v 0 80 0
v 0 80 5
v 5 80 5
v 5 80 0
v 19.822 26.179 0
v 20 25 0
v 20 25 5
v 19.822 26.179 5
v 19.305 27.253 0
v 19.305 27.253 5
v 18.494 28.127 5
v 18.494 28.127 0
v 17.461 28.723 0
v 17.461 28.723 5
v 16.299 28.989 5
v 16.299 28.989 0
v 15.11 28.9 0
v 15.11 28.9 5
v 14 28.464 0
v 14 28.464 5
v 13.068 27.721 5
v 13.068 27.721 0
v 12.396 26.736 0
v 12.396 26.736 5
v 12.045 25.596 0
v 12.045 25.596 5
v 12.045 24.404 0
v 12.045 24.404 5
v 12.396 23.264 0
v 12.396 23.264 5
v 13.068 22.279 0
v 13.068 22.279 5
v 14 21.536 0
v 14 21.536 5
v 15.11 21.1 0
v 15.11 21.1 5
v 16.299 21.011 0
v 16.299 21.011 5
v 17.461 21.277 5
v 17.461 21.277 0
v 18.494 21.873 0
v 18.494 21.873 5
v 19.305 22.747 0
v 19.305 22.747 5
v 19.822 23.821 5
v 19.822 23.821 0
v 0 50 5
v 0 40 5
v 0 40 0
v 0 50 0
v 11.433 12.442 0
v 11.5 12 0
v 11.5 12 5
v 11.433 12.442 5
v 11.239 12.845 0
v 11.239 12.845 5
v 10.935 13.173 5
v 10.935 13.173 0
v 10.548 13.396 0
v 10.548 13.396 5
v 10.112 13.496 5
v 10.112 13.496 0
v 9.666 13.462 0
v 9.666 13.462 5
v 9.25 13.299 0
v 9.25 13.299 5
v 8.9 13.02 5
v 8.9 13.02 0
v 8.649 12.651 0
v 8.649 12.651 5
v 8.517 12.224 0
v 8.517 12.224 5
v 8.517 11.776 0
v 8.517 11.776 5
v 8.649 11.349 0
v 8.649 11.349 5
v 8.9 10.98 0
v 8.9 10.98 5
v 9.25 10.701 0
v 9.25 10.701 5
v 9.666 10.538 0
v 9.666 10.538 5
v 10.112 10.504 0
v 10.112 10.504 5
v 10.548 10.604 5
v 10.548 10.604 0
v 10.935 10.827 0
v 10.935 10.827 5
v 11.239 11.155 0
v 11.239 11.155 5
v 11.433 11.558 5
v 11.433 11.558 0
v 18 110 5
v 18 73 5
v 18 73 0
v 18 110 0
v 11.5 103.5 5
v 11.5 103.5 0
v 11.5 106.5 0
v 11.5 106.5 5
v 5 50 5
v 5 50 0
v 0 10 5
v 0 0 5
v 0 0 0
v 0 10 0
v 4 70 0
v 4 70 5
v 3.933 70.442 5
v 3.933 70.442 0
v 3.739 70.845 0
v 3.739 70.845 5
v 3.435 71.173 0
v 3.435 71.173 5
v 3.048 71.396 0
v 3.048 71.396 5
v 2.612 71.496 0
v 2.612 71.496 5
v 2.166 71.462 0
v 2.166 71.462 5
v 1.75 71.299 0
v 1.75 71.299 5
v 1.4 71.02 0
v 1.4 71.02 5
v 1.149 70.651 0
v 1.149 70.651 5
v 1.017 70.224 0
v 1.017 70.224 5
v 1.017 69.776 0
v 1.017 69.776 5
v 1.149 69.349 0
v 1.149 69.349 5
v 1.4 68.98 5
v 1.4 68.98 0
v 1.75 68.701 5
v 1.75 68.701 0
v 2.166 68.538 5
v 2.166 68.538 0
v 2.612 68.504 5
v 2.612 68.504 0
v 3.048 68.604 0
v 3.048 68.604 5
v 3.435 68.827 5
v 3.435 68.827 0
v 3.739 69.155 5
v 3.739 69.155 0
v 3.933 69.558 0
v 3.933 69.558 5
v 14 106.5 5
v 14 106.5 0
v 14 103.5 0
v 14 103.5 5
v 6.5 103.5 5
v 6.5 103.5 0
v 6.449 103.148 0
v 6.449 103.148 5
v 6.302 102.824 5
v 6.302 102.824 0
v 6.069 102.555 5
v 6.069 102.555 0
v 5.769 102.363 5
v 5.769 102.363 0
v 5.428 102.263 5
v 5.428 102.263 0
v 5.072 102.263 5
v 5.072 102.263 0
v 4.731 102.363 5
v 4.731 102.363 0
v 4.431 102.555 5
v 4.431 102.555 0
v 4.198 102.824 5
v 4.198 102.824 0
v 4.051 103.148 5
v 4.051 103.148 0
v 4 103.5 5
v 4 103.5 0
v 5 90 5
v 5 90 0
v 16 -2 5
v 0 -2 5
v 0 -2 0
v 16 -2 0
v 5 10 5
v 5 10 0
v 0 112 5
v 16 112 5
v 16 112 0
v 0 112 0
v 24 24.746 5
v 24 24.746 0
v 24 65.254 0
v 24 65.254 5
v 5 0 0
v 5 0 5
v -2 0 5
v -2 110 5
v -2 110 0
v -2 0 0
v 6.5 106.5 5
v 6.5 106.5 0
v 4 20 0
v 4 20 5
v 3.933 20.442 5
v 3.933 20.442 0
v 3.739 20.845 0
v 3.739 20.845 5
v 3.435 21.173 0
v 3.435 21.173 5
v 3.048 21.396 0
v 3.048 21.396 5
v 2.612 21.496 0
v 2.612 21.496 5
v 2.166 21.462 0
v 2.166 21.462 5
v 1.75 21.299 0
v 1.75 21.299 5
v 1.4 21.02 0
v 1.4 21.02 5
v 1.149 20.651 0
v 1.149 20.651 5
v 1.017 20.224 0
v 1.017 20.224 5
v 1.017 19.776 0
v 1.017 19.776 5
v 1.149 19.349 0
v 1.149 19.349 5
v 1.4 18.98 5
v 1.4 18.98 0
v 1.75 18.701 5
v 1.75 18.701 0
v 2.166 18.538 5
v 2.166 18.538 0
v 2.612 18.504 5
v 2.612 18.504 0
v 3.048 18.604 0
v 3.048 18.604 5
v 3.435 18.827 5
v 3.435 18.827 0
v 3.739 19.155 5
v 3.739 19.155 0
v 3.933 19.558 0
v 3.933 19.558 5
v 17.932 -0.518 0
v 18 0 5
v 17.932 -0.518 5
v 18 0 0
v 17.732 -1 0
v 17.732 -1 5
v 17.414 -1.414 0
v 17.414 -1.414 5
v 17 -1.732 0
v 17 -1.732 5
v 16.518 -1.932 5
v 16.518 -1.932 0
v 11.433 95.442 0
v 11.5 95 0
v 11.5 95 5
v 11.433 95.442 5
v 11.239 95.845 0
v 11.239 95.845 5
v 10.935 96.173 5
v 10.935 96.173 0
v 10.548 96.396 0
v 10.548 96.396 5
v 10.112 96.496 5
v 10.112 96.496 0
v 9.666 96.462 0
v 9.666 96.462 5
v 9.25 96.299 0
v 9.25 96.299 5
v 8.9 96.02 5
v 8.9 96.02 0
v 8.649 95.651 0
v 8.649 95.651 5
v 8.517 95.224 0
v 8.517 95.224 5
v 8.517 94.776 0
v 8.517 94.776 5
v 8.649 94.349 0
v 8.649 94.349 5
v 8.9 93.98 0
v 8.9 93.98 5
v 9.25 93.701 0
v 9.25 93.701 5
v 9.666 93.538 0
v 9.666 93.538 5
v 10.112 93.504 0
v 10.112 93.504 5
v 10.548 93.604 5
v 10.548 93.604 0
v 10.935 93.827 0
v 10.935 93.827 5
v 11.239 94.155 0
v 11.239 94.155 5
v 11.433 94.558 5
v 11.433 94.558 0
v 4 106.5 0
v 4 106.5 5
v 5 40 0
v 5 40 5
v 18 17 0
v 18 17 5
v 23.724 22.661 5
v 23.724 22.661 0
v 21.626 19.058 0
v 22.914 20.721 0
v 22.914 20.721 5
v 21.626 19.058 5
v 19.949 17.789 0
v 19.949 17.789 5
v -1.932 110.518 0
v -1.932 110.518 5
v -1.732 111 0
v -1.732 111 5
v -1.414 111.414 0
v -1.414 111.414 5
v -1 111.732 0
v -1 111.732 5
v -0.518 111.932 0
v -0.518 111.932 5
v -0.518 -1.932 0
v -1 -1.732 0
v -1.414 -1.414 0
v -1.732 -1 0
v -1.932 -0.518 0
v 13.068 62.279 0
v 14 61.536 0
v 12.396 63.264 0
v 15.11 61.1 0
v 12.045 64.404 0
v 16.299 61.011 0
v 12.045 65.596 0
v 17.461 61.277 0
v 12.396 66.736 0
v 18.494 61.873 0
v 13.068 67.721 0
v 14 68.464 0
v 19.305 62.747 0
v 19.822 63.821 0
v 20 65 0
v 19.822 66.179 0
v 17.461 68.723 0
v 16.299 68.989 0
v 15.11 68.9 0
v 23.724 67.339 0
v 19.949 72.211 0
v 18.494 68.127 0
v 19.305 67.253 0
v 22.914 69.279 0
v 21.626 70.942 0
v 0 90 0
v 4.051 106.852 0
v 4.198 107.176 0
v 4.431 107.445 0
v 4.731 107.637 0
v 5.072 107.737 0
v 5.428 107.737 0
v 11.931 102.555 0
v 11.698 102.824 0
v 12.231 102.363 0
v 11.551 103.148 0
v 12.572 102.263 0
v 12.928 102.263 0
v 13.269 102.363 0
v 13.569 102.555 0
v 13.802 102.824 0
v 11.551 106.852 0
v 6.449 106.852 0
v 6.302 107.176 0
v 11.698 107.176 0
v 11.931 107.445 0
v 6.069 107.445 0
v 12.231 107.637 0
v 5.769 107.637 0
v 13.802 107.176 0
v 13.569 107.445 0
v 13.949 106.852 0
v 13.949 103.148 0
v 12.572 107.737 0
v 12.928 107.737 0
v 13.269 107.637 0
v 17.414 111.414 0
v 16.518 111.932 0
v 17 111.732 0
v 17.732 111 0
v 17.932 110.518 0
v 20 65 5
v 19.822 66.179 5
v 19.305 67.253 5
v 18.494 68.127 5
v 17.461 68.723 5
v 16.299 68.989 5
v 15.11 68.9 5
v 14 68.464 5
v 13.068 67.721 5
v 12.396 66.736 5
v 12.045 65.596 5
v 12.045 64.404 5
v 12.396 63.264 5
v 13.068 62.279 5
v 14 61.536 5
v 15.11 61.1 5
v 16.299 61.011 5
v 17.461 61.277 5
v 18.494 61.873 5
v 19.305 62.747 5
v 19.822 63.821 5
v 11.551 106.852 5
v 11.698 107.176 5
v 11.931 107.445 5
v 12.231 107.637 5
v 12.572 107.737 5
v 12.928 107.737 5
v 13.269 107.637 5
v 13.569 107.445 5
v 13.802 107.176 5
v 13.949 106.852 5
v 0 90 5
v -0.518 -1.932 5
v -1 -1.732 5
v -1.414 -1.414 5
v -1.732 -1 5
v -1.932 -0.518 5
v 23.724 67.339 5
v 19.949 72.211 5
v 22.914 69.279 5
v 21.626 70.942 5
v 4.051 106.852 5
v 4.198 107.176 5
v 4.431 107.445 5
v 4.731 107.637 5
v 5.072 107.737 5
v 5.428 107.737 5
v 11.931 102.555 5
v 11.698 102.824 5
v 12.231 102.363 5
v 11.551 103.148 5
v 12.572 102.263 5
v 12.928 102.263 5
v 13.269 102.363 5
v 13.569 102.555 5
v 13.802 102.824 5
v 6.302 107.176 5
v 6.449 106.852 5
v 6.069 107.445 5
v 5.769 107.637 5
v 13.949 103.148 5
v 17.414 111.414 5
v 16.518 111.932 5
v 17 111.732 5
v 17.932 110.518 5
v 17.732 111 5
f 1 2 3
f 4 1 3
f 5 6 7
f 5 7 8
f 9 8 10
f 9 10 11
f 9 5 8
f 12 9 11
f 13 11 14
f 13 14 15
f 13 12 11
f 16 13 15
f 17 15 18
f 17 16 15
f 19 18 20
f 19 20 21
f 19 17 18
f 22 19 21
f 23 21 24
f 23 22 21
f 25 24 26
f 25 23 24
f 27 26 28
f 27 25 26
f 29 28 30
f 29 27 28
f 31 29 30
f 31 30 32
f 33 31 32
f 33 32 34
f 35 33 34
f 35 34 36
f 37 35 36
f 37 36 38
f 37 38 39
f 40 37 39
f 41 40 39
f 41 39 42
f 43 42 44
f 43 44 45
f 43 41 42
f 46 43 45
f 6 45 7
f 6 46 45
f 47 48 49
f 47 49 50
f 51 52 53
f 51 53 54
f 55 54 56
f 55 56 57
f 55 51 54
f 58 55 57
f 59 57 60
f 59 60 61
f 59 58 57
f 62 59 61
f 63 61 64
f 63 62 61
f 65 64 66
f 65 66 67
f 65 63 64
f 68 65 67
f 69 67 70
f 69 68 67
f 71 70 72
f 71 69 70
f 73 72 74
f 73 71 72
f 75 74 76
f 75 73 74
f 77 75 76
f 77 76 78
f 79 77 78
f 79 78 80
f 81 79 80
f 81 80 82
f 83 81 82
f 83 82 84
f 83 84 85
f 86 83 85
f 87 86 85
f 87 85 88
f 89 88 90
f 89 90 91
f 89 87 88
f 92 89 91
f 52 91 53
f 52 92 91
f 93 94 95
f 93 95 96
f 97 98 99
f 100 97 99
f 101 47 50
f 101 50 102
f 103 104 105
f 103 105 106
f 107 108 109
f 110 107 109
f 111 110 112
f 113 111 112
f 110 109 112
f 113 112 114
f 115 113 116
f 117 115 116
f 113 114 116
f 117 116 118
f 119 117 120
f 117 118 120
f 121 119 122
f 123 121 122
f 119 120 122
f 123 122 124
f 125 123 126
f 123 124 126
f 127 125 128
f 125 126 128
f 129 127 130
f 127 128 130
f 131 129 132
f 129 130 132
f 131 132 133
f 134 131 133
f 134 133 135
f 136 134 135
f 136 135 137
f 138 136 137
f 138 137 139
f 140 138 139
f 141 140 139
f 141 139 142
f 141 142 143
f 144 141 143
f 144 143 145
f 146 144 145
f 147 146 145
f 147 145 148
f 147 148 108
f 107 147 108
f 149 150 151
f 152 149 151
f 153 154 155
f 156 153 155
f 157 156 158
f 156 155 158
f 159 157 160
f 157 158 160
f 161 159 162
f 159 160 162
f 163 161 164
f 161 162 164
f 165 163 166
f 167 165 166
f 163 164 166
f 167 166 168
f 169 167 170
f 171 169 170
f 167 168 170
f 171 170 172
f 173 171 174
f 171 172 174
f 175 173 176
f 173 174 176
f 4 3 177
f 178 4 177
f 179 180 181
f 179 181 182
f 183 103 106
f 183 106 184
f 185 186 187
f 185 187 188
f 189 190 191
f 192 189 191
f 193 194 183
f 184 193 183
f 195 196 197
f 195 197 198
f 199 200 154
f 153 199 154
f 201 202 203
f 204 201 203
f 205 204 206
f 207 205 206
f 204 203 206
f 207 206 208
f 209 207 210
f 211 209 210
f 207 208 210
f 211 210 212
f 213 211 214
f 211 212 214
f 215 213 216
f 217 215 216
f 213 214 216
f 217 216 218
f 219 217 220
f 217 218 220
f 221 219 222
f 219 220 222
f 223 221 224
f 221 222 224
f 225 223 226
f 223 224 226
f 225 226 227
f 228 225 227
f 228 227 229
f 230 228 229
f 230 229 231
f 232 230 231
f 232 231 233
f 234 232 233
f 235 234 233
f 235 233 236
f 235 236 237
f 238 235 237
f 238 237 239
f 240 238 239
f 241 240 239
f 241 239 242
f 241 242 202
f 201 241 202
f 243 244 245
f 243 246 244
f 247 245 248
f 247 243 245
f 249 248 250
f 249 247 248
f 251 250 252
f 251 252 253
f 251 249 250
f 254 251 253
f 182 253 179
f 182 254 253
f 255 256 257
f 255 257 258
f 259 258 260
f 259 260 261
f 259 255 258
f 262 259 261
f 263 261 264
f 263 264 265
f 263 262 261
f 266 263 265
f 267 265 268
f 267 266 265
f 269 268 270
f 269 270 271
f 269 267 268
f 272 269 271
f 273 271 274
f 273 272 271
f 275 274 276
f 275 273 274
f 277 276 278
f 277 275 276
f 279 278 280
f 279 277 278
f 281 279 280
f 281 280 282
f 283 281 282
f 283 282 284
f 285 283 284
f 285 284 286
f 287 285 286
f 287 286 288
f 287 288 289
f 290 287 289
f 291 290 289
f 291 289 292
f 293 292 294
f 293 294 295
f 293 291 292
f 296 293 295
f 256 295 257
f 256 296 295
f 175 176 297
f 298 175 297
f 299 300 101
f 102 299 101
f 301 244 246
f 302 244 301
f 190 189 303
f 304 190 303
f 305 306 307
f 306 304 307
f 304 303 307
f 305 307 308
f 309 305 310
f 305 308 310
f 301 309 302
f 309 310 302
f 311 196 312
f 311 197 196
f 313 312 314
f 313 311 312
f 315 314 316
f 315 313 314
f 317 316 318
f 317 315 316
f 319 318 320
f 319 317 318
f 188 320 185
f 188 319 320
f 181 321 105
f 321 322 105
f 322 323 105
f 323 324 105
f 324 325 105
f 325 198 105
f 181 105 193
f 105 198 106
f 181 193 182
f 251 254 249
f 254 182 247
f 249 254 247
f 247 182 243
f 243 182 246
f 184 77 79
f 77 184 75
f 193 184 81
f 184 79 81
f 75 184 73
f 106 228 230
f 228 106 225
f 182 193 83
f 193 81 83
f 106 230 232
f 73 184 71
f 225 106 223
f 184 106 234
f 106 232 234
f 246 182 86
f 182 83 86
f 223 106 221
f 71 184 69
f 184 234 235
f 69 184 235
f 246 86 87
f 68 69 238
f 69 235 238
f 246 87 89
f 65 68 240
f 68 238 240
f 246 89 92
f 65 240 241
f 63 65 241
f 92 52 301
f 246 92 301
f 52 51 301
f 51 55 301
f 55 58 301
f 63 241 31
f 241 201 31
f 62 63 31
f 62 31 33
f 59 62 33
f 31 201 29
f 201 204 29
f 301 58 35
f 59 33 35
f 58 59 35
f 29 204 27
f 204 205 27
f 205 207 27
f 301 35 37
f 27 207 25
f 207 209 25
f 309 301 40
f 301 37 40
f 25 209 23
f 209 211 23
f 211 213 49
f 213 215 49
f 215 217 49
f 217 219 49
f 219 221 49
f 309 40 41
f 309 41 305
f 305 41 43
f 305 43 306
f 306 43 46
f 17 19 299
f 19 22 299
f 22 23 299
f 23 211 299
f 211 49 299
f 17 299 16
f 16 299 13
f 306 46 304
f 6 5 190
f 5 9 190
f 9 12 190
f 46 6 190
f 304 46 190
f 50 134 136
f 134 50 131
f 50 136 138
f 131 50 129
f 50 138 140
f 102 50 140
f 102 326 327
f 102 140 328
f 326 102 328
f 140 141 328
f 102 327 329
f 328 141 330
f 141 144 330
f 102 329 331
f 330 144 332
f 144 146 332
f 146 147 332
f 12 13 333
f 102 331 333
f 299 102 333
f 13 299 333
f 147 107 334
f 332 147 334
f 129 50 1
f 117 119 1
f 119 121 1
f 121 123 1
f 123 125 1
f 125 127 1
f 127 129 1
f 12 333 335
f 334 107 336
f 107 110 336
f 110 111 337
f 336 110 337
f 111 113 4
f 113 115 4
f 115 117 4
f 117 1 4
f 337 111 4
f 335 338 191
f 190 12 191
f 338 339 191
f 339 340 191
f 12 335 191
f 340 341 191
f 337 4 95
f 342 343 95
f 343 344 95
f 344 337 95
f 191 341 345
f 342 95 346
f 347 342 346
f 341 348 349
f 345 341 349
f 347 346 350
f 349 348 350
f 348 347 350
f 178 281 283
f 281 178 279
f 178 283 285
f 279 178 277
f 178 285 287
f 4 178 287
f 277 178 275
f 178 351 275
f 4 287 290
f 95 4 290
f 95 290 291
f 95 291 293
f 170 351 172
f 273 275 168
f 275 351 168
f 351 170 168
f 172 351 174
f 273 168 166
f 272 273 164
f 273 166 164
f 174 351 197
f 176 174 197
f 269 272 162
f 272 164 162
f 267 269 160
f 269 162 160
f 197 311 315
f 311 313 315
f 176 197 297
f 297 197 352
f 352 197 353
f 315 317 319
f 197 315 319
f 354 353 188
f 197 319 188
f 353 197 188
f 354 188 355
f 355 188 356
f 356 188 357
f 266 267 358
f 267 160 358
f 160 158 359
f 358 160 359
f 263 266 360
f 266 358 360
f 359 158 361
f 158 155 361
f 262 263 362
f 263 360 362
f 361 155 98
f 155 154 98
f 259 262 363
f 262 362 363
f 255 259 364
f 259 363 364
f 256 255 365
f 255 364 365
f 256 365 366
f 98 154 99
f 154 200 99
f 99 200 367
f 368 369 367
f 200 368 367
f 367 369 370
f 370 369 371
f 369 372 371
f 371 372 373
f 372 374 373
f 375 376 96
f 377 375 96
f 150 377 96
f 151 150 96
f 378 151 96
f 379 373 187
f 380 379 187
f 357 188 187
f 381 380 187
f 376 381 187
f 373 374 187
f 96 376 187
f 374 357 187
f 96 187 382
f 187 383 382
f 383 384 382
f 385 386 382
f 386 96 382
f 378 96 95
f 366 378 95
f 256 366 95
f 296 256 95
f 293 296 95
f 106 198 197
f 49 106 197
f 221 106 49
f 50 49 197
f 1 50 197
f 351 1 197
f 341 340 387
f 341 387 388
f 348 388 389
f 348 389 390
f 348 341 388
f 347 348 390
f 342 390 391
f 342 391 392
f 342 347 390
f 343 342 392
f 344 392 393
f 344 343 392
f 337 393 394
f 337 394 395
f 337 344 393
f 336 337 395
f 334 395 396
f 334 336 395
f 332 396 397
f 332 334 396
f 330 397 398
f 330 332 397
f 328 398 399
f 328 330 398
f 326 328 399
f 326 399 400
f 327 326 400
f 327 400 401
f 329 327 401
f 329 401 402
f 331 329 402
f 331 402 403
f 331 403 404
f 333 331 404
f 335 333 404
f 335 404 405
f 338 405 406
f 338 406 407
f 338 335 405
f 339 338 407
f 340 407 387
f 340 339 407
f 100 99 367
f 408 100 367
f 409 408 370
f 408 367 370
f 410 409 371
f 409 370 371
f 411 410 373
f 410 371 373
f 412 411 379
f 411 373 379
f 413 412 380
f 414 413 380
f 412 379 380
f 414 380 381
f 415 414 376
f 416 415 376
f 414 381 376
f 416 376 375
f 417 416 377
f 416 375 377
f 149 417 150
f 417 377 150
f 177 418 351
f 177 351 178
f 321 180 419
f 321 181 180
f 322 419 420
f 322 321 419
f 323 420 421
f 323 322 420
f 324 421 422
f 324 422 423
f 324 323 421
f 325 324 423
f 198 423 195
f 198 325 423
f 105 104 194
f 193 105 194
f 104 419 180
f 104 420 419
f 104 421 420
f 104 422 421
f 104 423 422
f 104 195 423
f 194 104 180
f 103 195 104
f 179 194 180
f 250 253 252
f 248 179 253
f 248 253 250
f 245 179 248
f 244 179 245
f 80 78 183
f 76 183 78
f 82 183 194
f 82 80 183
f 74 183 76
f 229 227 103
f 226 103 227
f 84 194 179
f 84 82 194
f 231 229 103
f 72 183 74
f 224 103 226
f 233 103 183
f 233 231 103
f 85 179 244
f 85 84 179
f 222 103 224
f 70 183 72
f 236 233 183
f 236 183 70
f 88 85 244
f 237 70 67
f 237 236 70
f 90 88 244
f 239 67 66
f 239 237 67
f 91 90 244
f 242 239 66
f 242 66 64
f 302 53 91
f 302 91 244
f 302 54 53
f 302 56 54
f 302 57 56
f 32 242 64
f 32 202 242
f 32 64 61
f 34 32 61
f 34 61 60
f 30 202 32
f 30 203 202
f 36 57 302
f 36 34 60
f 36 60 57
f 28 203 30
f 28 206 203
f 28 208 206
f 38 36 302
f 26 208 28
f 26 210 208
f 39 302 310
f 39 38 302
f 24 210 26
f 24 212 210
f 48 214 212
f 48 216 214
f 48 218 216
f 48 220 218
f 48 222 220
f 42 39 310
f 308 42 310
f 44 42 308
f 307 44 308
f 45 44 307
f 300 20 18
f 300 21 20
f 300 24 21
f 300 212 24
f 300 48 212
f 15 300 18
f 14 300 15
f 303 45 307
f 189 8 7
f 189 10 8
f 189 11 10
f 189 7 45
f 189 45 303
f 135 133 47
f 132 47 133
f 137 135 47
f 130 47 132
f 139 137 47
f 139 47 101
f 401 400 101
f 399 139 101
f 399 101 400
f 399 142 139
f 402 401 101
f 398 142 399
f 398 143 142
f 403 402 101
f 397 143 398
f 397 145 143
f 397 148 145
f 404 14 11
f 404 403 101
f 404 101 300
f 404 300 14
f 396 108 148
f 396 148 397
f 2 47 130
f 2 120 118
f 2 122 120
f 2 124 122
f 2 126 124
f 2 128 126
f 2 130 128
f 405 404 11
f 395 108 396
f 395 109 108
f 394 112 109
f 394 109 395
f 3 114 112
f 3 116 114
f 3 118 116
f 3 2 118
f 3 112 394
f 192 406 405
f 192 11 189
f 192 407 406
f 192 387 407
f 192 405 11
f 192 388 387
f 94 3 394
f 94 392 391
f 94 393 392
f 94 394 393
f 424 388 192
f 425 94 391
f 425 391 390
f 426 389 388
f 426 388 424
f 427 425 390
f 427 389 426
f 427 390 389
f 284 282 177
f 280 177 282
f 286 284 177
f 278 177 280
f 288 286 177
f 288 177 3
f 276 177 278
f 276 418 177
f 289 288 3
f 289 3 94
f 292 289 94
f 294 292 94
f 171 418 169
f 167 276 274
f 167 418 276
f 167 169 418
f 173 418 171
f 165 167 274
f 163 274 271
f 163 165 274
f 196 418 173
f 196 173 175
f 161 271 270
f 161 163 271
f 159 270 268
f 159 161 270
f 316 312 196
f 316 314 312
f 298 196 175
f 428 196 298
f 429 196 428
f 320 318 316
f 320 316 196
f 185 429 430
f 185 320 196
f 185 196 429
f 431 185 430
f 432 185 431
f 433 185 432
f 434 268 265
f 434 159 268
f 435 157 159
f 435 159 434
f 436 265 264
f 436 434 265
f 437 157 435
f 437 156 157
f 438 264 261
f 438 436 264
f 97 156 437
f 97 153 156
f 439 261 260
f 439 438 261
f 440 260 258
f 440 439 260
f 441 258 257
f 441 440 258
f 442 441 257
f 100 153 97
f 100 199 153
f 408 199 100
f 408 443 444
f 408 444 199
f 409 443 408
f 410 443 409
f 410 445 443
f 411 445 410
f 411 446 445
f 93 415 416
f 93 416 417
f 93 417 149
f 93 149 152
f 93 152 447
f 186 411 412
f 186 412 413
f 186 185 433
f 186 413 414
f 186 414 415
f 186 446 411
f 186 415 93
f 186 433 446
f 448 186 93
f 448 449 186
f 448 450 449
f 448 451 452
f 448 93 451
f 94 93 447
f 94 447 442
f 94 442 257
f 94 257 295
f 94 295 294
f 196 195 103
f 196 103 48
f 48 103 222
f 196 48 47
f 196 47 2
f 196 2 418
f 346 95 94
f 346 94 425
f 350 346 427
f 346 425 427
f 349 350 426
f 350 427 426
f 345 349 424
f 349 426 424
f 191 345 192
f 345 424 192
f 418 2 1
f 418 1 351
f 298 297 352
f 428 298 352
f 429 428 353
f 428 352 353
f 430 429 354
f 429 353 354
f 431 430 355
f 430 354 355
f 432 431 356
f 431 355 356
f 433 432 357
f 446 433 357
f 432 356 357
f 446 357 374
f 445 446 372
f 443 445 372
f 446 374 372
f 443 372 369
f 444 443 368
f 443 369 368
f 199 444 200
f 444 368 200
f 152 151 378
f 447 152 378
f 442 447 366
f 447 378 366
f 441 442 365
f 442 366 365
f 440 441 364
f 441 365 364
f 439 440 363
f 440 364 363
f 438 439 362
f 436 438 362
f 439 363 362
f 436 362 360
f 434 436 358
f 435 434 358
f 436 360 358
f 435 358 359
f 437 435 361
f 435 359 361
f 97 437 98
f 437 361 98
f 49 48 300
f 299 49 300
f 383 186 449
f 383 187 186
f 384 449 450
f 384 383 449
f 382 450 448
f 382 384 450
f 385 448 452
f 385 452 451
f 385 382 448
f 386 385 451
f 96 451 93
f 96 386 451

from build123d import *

# Parameters (mm, degrees)
SKETCH1_W           = 24
SKETCH1_H           = 110
SKETCH1_R           = 4
SKETCH1_R_2         = 1.5
BOSS_EXTRUDE1_DEPTH = 5
SKETCH2_W           = 6
SKETCH2_H           = 37
SKETCH2_H_2         = 17
CUT_EXTRUDE1_DEPTH  = 113.698713391
BOSS_EXTRUDE2_DEPTH = 5
SKETCH4_R           = 1.5
SKETCH4_W           = 5
SKETCH4_H           = 10
CUT_EXTRUDE2_DEPTH  = 115.651646303
FILLET1_R           = 2
FILLET2_R           = 8


with BuildPart() as part:
    # Sketch1 → Boss-Extrude1 (new body)
    with BuildSketch(Plane.XY):
        with Locations((12, 55)):
            Rectangle(SKETCH1_W, SKETCH1_H)
        with Locations((16, 65)):
            Circle(SKETCH1_R, mode=Mode.SUBTRACT)
        with Locations((16, 25)):
            Circle(SKETCH1_R, mode=Mode.SUBTRACT)
        with Locations((10, 12)):
            Circle(SKETCH1_R_2, mode=Mode.SUBTRACT)
        with Locations((10, 95)):
            Circle(SKETCH1_R_2, mode=Mode.SUBTRACT)
        with BuildLine():
            Line((4, 103.5), (4, 106.5))
            ThreePointArc((4, 106.5), (5.25, 107.75), (6.5, 106.5))
            Line((6.5, 106.5), (6.5, 103.5))
            ThreePointArc((6.5, 103.5), (5.25, 102.25), (4, 103.5))
        make_face(mode=Mode.SUBTRACT)
        with BuildLine():
            Line((11.5, 103.5), (11.5, 106.5))
            ThreePointArc((11.5, 106.5), (12.75, 107.75), (14, 106.5))
            Line((14, 106.5), (14, 103.5))
            ThreePointArc((14, 103.5), (12.75, 102.25), (11.5, 103.5))
        make_face(mode=Mode.SUBTRACT)
    extrude(amount=BOSS_EXTRUDE1_DEPTH)

    # Sketch2 → Cut-Extrude1 (cut, through all)
    with BuildSketch(Plane.XY.offset(5)):
        with Locations((21, 91.5)):
            Rectangle(SKETCH2_W, SKETCH2_H)
        with Locations((21, 8.5)):
            Rectangle(SKETCH2_W, SKETCH2_H_2)
    extrude(amount=-CUT_EXTRUDE1_DEPTH, mode=Mode.SUBTRACT)

    # Sketch3 → Boss-Extrude2 (add)
    with BuildSketch(Plane.XY.offset(5)):
        Polygon((18, -2), (18, 0), (0, 0), (0, 110), (18, 110), (18, 112), (-2, 112), (-2, -2), align=None)
    extrude(amount=-BOSS_EXTRUDE2_DEPTH)

    # Sketch4 → Cut-Extrude2 (cut, through all)
    with BuildSketch(Plane.XY.offset(5)):
        with Locations((2.5, 20)):
            Circle(SKETCH4_R)
        with Locations((2.5, 70)):
            Circle(SKETCH4_R)
        with Locations((2.5, 5)):
            Rectangle(SKETCH4_W, SKETCH4_H)
        with Locations((2.5, 85)):
            Rectangle(SKETCH4_W, SKETCH4_H)
        with Locations((2.5, 45)):
            Rectangle(SKETCH4_W, SKETCH4_H)
    extrude(amount=-CUT_EXTRUDE2_DEPTH, mode=Mode.SUBTRACT)

    # Fillet1
    fillet1_edges = [part.edges().sort_by_distance(p)[0] for p in [
        (18, 112, 2.5),
        (-2, 112, 2.5),
        (-2, -2, 2.5),
        (18, -2, 2.5),
    ]]
    fillet(fillet1_edges, radius=FILLET1_R)

    # Fillet2
    # the kernel refuses this fillet: 8 mm, written as the material it takes off along each edge
    with BuildSketch(Plane(origin=(24, 17, 24.364916731), x_dir=(0, 1, 0), z_dir=(0, 0, -1))) as fillet2_piece_1:
        with BuildLine():
            CenterArc((7.745966692, -8), FILLET2_R, 90, 75.522487814)
            Line((0, -6), (-0.154919334, -5.96))
            ThreePointArc((-0.154919334, -5.96), (-0.16, -3), (-0.16, 0))
            Line((-0.16, 0), (0, 0.16))
            Line((0, 0.16), (7.745966692, 0.16))
            Line((7.745966692, 0.16), (7.745966692, 0))
        make_face()
    extrude(amount=43.729833462, mode=Mode.SUBTRACT)
    with BuildSketch(Plane(origin=(24, 73, 24.364916731), x_dir=(-1, 0, 0), z_dir=(0, 0, -1))) as fillet2_piece_2:
        with BuildLine():
            CenterArc((8, -7.745966692), FILLET2_R, 104.477512186, 75.522487814)
            Line((0, -7.745966692), (-0.16, -7.745966692))
            Line((-0.16, -7.745966692), (-0.16, 0))
            Line((-0.16, 0), (0, 0.16))
            ThreePointArc((0, 0.16), (3, 0.16), (5.96, 0.154919334))
            Line((5.96, 0.154919334), (6, 0))
        make_face()
    extrude(amount=43.729833462, mode=Mode.SUBTRACT)


solid = part.part
